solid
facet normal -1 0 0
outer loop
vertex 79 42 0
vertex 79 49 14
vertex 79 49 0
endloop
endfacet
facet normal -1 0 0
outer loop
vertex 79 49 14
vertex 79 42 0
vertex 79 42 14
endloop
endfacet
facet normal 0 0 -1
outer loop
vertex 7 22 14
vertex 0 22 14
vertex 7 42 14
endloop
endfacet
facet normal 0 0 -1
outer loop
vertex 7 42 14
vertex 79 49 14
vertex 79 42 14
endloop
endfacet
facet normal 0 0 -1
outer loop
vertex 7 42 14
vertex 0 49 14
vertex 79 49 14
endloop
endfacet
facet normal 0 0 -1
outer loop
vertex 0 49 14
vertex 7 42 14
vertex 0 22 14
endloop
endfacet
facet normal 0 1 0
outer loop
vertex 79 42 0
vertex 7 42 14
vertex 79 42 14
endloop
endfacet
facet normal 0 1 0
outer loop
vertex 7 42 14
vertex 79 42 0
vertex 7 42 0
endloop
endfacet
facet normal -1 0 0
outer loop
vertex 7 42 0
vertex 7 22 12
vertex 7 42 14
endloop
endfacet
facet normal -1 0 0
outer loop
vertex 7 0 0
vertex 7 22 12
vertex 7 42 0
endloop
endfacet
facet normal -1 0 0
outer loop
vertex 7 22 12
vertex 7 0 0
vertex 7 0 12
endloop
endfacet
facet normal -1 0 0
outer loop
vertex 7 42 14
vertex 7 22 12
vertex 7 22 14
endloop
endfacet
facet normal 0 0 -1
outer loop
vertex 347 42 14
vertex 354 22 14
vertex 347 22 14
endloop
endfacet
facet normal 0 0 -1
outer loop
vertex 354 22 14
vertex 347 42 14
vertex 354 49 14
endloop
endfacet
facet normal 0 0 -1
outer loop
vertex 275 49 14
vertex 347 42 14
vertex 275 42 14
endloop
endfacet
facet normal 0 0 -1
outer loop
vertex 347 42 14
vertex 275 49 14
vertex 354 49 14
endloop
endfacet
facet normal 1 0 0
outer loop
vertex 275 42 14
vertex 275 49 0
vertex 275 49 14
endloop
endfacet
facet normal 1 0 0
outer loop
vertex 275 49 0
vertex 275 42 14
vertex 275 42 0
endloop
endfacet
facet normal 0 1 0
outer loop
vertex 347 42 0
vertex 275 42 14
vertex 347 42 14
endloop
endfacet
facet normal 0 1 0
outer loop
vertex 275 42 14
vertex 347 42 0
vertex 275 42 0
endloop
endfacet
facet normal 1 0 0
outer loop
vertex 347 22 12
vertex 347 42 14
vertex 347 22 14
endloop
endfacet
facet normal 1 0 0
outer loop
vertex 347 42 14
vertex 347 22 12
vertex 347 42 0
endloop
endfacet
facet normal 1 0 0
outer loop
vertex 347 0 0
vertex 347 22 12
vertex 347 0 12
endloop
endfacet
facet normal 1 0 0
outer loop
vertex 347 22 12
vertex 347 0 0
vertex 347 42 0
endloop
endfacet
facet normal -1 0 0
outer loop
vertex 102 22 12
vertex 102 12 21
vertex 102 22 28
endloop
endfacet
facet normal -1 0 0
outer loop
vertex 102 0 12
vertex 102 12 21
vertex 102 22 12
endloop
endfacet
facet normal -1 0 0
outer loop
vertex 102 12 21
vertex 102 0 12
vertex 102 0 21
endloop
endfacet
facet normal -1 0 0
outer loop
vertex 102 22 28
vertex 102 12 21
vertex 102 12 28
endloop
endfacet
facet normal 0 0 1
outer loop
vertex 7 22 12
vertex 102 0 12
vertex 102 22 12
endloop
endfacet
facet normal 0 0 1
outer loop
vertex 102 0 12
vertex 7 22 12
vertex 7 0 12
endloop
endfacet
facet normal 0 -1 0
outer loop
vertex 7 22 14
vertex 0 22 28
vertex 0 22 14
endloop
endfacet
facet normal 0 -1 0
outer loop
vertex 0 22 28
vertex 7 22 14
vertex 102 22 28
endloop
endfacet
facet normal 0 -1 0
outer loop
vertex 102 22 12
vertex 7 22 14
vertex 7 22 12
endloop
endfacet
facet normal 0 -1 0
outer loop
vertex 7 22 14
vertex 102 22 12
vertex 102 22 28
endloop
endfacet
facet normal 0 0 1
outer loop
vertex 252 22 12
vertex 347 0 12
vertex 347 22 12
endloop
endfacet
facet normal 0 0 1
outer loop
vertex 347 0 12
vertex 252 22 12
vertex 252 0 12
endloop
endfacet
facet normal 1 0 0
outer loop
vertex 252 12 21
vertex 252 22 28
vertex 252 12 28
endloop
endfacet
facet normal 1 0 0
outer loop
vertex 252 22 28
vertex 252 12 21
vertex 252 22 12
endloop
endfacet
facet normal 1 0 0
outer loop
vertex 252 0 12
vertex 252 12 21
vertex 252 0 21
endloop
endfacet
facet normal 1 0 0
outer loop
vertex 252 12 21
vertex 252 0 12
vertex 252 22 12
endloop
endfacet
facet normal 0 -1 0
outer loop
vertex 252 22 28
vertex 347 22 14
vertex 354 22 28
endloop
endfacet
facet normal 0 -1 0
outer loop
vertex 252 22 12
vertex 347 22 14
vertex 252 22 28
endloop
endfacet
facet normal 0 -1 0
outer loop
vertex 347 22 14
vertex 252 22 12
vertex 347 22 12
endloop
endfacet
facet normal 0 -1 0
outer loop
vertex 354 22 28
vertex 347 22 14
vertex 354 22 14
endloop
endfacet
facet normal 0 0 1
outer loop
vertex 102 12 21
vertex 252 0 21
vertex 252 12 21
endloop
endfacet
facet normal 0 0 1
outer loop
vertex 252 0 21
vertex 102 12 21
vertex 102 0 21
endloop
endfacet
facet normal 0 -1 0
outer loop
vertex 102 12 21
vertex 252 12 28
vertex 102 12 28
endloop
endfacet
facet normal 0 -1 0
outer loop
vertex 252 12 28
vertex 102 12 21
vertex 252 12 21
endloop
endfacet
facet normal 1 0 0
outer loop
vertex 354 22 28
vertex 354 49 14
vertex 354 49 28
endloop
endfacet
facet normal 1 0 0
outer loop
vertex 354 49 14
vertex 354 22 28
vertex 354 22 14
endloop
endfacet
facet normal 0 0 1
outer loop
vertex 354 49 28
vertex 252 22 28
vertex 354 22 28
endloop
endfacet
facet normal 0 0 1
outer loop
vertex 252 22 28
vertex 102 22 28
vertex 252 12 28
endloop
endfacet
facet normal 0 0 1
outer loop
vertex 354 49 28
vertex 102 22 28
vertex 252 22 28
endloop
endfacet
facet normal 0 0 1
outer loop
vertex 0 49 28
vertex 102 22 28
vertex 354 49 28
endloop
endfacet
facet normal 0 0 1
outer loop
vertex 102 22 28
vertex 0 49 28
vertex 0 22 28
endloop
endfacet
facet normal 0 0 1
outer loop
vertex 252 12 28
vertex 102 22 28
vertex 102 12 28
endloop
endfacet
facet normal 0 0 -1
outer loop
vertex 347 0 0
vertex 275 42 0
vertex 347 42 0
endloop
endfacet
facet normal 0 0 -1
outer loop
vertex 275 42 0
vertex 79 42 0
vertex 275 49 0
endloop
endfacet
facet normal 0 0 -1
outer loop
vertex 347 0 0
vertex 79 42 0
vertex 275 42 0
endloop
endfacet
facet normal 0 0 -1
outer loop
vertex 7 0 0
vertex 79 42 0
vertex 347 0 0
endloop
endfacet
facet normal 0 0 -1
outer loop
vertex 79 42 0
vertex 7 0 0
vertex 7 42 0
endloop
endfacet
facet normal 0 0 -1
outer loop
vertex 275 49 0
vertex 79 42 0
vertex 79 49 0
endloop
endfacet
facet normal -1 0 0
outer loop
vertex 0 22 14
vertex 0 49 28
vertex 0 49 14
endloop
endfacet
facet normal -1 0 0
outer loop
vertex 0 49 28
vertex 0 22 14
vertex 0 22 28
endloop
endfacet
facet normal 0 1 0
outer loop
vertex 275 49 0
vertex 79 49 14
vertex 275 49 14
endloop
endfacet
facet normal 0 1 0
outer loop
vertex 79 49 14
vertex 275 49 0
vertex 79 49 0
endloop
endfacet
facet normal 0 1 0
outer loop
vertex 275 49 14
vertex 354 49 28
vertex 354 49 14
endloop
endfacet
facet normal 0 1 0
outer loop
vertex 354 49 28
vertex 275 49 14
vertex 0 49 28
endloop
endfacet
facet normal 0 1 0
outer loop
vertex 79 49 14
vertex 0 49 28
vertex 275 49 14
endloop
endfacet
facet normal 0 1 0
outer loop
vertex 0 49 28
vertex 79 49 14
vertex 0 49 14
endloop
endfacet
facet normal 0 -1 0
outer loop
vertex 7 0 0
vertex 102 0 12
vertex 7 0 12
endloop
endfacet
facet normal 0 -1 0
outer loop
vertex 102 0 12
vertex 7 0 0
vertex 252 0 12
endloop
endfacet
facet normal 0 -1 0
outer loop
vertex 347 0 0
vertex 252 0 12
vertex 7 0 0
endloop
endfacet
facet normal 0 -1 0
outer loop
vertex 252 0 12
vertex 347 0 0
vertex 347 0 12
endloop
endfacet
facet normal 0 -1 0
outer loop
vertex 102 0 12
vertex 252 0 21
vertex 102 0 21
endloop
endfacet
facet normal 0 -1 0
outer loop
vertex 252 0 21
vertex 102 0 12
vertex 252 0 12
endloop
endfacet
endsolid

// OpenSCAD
include <../src/wardrobe.scad>;
plank_xy_top(wardrobe_n);
//github_openscad -o wardrobe_2/plank_xy_top.stl -D wardrobe_n=2 -D cutting_edge=0 -D break_view_length=0 wardrobe_2/plank_xy_top_stl.scad
